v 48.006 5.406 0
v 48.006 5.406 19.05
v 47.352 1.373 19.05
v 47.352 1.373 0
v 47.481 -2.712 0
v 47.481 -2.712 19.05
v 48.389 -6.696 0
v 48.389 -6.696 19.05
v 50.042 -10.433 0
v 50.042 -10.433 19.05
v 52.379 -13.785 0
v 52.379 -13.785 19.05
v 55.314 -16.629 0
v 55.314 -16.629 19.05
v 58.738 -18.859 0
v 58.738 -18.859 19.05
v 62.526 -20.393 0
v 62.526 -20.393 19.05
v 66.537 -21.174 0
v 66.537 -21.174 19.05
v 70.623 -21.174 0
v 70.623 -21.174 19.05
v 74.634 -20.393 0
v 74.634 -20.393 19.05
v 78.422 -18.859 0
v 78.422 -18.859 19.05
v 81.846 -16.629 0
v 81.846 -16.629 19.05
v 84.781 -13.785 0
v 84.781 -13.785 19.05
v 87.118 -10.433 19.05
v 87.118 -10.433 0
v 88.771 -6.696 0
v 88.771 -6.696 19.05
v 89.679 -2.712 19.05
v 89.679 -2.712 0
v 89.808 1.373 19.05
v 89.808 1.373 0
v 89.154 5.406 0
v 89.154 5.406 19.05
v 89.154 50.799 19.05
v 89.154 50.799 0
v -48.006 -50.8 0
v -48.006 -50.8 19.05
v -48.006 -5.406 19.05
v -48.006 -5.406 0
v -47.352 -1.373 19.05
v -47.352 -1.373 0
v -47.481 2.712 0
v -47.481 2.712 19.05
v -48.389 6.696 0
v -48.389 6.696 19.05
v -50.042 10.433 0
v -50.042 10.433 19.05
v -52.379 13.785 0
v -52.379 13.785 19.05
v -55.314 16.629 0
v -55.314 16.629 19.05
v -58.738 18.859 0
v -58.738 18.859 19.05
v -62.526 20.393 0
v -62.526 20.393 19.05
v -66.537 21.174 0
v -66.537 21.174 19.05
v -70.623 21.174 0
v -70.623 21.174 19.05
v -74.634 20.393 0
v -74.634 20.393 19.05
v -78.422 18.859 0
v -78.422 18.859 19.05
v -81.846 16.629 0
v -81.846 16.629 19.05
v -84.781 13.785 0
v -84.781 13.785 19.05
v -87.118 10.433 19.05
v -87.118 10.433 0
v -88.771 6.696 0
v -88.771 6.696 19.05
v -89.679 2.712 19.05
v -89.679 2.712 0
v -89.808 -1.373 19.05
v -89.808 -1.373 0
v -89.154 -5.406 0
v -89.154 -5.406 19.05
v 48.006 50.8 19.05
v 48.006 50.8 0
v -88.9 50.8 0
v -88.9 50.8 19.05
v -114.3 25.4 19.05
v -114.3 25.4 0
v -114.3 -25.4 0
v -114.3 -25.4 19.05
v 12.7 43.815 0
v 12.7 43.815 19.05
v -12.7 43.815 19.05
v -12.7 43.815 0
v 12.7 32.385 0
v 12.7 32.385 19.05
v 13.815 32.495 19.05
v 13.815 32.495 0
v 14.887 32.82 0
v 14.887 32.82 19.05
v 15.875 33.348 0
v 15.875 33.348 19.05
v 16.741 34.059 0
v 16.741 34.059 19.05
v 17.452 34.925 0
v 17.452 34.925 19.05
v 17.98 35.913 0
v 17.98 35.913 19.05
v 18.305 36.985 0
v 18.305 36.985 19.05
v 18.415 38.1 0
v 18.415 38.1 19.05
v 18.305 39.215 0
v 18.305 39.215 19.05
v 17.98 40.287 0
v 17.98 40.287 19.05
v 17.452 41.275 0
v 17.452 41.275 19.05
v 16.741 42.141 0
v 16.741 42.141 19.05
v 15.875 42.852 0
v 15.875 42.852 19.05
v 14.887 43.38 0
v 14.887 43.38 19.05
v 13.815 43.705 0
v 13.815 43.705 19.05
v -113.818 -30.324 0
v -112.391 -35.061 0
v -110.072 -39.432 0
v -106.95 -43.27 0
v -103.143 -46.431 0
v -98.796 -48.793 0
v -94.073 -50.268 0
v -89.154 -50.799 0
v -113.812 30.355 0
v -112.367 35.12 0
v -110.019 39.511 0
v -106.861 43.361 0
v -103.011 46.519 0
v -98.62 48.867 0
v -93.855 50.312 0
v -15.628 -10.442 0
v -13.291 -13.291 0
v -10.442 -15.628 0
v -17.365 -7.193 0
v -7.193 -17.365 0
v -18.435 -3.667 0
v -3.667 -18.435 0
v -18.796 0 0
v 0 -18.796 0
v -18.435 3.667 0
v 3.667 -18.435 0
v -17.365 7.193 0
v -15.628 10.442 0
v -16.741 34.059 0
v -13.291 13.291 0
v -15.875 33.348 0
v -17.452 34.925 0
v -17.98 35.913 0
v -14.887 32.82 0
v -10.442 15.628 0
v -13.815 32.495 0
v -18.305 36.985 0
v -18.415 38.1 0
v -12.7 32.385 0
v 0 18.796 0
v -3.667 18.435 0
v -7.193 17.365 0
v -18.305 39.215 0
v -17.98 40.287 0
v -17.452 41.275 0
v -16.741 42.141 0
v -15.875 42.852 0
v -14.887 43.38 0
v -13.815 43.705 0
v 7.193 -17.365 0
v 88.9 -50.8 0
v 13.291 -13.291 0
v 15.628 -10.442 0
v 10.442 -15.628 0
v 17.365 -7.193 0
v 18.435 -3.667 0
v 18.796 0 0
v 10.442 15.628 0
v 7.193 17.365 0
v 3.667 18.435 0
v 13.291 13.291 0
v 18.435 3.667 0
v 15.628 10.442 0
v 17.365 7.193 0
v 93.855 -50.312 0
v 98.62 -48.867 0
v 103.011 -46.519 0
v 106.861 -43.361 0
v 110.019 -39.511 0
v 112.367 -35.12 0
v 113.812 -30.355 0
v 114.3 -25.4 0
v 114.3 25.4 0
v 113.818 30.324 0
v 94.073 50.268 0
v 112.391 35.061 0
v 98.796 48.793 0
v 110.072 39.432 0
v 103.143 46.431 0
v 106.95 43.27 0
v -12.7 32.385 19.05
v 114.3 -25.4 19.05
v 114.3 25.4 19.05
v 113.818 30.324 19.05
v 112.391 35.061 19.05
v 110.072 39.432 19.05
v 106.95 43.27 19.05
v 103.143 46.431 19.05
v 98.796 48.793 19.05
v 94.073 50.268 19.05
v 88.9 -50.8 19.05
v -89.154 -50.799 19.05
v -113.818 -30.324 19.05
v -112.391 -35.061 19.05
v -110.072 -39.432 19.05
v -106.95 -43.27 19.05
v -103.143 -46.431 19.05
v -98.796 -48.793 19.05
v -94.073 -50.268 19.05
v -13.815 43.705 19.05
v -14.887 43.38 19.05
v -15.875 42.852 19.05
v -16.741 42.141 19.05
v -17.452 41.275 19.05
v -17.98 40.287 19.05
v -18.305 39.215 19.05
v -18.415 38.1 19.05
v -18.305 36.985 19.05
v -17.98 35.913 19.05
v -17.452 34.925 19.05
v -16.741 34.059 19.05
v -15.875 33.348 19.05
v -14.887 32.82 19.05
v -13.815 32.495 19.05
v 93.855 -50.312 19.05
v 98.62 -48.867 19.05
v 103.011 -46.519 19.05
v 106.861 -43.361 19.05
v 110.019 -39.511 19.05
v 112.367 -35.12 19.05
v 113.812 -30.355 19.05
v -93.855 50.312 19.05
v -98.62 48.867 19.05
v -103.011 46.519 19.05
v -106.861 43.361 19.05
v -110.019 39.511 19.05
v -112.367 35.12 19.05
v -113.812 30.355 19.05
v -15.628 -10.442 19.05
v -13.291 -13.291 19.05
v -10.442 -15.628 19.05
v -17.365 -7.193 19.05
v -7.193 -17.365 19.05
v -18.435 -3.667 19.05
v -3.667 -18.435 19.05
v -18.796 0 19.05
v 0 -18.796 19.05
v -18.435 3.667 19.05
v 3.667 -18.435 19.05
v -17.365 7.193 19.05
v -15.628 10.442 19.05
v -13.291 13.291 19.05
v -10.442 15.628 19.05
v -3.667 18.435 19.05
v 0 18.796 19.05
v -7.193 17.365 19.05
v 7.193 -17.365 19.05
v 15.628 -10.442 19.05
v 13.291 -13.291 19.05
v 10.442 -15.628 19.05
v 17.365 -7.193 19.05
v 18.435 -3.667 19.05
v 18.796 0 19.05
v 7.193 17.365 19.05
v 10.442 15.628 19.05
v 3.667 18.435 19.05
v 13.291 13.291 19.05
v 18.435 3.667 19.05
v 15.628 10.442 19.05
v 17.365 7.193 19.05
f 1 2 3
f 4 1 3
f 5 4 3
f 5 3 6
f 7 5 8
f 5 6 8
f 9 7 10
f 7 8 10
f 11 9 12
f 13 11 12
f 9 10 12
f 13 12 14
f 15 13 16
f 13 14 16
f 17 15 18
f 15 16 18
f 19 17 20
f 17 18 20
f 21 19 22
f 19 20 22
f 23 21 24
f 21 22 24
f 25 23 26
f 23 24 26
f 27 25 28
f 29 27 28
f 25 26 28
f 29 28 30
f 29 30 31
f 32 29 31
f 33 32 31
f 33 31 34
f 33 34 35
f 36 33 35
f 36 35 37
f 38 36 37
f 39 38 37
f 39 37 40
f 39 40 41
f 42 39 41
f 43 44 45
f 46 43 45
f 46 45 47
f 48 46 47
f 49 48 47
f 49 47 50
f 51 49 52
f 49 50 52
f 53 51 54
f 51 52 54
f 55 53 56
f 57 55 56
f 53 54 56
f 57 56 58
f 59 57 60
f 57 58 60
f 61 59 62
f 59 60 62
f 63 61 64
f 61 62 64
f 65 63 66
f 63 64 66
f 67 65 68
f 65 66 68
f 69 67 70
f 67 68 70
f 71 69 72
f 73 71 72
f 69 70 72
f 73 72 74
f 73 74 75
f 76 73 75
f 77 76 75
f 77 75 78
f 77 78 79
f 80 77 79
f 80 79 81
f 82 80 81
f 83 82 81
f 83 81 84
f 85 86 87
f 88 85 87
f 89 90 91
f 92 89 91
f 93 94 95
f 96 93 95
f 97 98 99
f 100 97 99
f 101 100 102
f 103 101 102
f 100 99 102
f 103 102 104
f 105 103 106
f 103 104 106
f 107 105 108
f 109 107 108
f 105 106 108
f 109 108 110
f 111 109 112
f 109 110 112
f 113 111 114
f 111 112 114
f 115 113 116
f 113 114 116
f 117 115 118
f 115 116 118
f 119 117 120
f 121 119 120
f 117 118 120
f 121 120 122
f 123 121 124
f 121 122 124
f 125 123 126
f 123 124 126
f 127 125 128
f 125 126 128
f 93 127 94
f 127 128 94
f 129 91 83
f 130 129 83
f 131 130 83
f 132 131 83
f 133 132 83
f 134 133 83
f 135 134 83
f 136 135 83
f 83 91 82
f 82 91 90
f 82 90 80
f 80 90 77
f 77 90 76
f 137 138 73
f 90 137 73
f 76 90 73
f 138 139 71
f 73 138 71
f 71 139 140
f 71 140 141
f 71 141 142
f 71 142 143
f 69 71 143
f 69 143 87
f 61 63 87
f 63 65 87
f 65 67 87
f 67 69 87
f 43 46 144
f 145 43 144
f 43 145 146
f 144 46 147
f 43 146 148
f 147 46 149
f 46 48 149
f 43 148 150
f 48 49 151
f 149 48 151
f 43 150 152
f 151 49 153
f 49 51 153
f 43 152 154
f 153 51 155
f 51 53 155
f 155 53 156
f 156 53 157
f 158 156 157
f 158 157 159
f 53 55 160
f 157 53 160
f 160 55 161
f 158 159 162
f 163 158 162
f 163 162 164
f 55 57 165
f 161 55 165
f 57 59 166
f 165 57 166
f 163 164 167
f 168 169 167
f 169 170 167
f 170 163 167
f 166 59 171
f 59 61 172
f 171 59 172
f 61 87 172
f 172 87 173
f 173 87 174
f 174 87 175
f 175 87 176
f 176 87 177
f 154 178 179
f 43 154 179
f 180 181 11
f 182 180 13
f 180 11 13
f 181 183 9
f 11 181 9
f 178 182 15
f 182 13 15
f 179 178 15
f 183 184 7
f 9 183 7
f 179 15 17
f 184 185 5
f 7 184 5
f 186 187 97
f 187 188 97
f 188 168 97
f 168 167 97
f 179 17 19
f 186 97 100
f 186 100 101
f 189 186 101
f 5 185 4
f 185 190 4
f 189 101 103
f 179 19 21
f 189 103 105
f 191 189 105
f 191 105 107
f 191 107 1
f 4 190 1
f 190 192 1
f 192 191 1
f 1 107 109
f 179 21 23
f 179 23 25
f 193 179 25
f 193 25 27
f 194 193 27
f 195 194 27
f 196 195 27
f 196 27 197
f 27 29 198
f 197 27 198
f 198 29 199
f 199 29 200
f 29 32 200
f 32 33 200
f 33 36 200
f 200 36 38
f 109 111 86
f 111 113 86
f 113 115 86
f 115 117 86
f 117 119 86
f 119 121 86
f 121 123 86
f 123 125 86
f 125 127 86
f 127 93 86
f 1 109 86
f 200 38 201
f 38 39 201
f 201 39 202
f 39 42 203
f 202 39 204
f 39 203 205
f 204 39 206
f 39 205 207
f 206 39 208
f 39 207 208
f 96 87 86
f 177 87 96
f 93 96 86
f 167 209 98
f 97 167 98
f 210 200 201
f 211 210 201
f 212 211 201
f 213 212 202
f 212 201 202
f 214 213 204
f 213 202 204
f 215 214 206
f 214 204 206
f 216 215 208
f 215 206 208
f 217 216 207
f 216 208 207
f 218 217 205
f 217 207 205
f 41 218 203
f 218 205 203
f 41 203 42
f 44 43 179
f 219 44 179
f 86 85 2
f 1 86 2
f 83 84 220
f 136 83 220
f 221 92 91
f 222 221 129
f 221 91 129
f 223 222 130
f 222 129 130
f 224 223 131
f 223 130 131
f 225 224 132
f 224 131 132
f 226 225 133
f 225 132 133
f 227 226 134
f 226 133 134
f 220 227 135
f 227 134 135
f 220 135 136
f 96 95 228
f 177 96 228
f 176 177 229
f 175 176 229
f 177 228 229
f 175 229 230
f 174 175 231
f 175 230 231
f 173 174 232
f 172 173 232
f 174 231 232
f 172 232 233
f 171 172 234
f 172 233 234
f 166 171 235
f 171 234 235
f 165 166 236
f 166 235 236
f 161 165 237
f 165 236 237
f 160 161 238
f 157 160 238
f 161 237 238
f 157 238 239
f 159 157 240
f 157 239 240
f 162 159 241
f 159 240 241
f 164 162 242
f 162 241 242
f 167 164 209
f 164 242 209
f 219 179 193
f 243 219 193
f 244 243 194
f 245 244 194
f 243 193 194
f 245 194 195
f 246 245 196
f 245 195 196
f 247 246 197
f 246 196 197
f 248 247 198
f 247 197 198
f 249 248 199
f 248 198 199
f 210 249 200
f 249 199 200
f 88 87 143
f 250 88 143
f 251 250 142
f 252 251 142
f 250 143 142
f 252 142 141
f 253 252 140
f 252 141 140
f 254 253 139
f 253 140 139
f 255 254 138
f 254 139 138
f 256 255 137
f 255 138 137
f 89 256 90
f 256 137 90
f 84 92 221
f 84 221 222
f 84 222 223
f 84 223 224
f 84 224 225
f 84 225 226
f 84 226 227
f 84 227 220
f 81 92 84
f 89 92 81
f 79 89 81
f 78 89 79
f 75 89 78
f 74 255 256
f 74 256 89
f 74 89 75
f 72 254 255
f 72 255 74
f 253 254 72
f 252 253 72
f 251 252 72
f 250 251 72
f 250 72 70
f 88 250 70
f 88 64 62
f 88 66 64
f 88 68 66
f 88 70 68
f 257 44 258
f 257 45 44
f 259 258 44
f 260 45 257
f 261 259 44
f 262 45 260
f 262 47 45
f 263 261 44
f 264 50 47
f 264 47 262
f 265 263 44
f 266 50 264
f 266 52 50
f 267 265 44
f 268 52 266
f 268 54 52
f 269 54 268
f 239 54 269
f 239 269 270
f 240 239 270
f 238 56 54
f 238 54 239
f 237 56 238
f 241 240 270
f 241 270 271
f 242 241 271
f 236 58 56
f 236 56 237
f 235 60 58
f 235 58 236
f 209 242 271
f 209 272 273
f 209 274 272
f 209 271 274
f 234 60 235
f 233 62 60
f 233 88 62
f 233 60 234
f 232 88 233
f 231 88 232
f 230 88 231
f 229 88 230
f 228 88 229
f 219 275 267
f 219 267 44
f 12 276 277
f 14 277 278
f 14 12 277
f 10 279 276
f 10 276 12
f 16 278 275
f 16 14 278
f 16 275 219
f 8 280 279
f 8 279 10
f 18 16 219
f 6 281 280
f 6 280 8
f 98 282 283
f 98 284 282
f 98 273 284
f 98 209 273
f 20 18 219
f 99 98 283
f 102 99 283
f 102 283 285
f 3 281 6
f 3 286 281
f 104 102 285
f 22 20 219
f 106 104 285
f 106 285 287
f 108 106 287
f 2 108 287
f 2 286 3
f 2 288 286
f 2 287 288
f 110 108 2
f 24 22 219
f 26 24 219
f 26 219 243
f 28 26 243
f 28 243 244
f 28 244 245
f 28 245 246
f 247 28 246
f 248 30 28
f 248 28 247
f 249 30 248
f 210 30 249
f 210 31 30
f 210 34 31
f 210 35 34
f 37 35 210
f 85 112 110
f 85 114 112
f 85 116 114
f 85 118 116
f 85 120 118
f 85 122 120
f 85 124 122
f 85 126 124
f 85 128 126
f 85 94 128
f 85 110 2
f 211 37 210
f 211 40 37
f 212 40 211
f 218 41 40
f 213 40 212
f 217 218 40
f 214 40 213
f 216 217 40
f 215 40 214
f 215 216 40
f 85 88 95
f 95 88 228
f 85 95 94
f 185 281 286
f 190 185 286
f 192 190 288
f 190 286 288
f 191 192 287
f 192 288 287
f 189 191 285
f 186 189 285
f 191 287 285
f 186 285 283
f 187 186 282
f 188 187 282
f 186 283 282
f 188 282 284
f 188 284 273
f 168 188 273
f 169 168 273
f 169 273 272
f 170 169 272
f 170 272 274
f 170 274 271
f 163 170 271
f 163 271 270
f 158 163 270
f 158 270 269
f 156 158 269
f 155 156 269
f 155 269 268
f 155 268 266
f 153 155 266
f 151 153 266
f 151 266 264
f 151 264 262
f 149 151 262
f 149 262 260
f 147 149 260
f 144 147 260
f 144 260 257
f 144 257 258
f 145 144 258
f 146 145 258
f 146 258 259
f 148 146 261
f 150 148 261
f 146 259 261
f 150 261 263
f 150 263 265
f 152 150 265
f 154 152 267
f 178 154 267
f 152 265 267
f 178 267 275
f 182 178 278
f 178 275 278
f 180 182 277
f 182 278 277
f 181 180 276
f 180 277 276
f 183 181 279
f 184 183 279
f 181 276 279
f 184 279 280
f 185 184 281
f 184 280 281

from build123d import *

# Parameters (mm, degrees)
F1_DEPTH = 19.05
F2_R     = 18.796
F3_DEPTH = 19.051
F5_DEPTH = 19.051
F7_DEPTH = 19.051


with BuildPart() as f1:
    # F0 (on Top) → F1 (new body)
    with BuildSketch(Plane.XY):
        with BuildLine():
            ThreePointArc((114.3, 25.4), (106.860512, 43.360512), (88.9, 50.8))
            Line((88.9, 50.8), (-88.9, 50.8))
            ThreePointArc((-88.9, 50.8), (-106.860512, 43.360512), (-114.3, 25.4))
            Line((-114.3, 25.4), (-114.3, -25.4))
            ThreePointArc((-114.3, -25.4), (-106.860512, -43.360512), (-88.9, -50.8))
            Line((-88.9, -50.8), (88.9, -50.8))
            ThreePointArc((88.9, -50.8), (106.860512, -43.360512), (114.3, -25.4))
            Line((114.3, -25.4), (114.3, 25.4))
        make_face()
    extrude(amount=F1_DEPTH)

    # F2 (on face) → F3 (cut, through all)
    with BuildSketch(Plane.XY.offset(19.05)):
        Circle(F2_R)
    extrude(amount=-F3_DEPTH, mode=Mode.SUBTRACT)

    # F4 (on face) → F5 (cut, through all)
    with BuildSketch(Plane.XY.offset(19.05)):
        with BuildLine():
            Line((-48.006, -50.8), (-48.006, -5.406457))
            ThreePointArc((-48.006, -5.406457), (-68.58, 21.2725), (-89.154, -5.406457))
            Line((-89.154, -5.406457), (-89.154, -50.8))
            Line((-89.154, -50.8), (-48.006, -50.8))
        make_face()
        with BuildLine():
            ThreePointArc((48.006, 5.406457), (68.58, -21.2725), (89.154, 5.406457))
            Line((89.154, 5.406457), (89.154, 50.8))
            Line((89.154, 50.8), (48.006, 50.8))
            Line((48.006, 50.8), (48.006, 5.406457))
        make_face()
    extrude(amount=-F5_DEPTH, mode=Mode.SUBTRACT)

    # F6 (on face) → F7 (cut, through all)
    with BuildSketch(Plane.XY.offset(19.05)):
        with BuildLine():
            ThreePointArc((-12.7, 43.815), (-18.415, 38.1), (-12.7, 32.385))
            Line((-12.7, 32.385), (12.7, 32.385))
            ThreePointArc((12.7, 32.385), (18.415, 38.1), (12.7, 43.815))
            Line((12.7, 43.815), (-12.7, 43.815))
        make_face()
    extrude(amount=-F7_DEPTH, mode=Mode.SUBTRACT)


solid = f1.part
